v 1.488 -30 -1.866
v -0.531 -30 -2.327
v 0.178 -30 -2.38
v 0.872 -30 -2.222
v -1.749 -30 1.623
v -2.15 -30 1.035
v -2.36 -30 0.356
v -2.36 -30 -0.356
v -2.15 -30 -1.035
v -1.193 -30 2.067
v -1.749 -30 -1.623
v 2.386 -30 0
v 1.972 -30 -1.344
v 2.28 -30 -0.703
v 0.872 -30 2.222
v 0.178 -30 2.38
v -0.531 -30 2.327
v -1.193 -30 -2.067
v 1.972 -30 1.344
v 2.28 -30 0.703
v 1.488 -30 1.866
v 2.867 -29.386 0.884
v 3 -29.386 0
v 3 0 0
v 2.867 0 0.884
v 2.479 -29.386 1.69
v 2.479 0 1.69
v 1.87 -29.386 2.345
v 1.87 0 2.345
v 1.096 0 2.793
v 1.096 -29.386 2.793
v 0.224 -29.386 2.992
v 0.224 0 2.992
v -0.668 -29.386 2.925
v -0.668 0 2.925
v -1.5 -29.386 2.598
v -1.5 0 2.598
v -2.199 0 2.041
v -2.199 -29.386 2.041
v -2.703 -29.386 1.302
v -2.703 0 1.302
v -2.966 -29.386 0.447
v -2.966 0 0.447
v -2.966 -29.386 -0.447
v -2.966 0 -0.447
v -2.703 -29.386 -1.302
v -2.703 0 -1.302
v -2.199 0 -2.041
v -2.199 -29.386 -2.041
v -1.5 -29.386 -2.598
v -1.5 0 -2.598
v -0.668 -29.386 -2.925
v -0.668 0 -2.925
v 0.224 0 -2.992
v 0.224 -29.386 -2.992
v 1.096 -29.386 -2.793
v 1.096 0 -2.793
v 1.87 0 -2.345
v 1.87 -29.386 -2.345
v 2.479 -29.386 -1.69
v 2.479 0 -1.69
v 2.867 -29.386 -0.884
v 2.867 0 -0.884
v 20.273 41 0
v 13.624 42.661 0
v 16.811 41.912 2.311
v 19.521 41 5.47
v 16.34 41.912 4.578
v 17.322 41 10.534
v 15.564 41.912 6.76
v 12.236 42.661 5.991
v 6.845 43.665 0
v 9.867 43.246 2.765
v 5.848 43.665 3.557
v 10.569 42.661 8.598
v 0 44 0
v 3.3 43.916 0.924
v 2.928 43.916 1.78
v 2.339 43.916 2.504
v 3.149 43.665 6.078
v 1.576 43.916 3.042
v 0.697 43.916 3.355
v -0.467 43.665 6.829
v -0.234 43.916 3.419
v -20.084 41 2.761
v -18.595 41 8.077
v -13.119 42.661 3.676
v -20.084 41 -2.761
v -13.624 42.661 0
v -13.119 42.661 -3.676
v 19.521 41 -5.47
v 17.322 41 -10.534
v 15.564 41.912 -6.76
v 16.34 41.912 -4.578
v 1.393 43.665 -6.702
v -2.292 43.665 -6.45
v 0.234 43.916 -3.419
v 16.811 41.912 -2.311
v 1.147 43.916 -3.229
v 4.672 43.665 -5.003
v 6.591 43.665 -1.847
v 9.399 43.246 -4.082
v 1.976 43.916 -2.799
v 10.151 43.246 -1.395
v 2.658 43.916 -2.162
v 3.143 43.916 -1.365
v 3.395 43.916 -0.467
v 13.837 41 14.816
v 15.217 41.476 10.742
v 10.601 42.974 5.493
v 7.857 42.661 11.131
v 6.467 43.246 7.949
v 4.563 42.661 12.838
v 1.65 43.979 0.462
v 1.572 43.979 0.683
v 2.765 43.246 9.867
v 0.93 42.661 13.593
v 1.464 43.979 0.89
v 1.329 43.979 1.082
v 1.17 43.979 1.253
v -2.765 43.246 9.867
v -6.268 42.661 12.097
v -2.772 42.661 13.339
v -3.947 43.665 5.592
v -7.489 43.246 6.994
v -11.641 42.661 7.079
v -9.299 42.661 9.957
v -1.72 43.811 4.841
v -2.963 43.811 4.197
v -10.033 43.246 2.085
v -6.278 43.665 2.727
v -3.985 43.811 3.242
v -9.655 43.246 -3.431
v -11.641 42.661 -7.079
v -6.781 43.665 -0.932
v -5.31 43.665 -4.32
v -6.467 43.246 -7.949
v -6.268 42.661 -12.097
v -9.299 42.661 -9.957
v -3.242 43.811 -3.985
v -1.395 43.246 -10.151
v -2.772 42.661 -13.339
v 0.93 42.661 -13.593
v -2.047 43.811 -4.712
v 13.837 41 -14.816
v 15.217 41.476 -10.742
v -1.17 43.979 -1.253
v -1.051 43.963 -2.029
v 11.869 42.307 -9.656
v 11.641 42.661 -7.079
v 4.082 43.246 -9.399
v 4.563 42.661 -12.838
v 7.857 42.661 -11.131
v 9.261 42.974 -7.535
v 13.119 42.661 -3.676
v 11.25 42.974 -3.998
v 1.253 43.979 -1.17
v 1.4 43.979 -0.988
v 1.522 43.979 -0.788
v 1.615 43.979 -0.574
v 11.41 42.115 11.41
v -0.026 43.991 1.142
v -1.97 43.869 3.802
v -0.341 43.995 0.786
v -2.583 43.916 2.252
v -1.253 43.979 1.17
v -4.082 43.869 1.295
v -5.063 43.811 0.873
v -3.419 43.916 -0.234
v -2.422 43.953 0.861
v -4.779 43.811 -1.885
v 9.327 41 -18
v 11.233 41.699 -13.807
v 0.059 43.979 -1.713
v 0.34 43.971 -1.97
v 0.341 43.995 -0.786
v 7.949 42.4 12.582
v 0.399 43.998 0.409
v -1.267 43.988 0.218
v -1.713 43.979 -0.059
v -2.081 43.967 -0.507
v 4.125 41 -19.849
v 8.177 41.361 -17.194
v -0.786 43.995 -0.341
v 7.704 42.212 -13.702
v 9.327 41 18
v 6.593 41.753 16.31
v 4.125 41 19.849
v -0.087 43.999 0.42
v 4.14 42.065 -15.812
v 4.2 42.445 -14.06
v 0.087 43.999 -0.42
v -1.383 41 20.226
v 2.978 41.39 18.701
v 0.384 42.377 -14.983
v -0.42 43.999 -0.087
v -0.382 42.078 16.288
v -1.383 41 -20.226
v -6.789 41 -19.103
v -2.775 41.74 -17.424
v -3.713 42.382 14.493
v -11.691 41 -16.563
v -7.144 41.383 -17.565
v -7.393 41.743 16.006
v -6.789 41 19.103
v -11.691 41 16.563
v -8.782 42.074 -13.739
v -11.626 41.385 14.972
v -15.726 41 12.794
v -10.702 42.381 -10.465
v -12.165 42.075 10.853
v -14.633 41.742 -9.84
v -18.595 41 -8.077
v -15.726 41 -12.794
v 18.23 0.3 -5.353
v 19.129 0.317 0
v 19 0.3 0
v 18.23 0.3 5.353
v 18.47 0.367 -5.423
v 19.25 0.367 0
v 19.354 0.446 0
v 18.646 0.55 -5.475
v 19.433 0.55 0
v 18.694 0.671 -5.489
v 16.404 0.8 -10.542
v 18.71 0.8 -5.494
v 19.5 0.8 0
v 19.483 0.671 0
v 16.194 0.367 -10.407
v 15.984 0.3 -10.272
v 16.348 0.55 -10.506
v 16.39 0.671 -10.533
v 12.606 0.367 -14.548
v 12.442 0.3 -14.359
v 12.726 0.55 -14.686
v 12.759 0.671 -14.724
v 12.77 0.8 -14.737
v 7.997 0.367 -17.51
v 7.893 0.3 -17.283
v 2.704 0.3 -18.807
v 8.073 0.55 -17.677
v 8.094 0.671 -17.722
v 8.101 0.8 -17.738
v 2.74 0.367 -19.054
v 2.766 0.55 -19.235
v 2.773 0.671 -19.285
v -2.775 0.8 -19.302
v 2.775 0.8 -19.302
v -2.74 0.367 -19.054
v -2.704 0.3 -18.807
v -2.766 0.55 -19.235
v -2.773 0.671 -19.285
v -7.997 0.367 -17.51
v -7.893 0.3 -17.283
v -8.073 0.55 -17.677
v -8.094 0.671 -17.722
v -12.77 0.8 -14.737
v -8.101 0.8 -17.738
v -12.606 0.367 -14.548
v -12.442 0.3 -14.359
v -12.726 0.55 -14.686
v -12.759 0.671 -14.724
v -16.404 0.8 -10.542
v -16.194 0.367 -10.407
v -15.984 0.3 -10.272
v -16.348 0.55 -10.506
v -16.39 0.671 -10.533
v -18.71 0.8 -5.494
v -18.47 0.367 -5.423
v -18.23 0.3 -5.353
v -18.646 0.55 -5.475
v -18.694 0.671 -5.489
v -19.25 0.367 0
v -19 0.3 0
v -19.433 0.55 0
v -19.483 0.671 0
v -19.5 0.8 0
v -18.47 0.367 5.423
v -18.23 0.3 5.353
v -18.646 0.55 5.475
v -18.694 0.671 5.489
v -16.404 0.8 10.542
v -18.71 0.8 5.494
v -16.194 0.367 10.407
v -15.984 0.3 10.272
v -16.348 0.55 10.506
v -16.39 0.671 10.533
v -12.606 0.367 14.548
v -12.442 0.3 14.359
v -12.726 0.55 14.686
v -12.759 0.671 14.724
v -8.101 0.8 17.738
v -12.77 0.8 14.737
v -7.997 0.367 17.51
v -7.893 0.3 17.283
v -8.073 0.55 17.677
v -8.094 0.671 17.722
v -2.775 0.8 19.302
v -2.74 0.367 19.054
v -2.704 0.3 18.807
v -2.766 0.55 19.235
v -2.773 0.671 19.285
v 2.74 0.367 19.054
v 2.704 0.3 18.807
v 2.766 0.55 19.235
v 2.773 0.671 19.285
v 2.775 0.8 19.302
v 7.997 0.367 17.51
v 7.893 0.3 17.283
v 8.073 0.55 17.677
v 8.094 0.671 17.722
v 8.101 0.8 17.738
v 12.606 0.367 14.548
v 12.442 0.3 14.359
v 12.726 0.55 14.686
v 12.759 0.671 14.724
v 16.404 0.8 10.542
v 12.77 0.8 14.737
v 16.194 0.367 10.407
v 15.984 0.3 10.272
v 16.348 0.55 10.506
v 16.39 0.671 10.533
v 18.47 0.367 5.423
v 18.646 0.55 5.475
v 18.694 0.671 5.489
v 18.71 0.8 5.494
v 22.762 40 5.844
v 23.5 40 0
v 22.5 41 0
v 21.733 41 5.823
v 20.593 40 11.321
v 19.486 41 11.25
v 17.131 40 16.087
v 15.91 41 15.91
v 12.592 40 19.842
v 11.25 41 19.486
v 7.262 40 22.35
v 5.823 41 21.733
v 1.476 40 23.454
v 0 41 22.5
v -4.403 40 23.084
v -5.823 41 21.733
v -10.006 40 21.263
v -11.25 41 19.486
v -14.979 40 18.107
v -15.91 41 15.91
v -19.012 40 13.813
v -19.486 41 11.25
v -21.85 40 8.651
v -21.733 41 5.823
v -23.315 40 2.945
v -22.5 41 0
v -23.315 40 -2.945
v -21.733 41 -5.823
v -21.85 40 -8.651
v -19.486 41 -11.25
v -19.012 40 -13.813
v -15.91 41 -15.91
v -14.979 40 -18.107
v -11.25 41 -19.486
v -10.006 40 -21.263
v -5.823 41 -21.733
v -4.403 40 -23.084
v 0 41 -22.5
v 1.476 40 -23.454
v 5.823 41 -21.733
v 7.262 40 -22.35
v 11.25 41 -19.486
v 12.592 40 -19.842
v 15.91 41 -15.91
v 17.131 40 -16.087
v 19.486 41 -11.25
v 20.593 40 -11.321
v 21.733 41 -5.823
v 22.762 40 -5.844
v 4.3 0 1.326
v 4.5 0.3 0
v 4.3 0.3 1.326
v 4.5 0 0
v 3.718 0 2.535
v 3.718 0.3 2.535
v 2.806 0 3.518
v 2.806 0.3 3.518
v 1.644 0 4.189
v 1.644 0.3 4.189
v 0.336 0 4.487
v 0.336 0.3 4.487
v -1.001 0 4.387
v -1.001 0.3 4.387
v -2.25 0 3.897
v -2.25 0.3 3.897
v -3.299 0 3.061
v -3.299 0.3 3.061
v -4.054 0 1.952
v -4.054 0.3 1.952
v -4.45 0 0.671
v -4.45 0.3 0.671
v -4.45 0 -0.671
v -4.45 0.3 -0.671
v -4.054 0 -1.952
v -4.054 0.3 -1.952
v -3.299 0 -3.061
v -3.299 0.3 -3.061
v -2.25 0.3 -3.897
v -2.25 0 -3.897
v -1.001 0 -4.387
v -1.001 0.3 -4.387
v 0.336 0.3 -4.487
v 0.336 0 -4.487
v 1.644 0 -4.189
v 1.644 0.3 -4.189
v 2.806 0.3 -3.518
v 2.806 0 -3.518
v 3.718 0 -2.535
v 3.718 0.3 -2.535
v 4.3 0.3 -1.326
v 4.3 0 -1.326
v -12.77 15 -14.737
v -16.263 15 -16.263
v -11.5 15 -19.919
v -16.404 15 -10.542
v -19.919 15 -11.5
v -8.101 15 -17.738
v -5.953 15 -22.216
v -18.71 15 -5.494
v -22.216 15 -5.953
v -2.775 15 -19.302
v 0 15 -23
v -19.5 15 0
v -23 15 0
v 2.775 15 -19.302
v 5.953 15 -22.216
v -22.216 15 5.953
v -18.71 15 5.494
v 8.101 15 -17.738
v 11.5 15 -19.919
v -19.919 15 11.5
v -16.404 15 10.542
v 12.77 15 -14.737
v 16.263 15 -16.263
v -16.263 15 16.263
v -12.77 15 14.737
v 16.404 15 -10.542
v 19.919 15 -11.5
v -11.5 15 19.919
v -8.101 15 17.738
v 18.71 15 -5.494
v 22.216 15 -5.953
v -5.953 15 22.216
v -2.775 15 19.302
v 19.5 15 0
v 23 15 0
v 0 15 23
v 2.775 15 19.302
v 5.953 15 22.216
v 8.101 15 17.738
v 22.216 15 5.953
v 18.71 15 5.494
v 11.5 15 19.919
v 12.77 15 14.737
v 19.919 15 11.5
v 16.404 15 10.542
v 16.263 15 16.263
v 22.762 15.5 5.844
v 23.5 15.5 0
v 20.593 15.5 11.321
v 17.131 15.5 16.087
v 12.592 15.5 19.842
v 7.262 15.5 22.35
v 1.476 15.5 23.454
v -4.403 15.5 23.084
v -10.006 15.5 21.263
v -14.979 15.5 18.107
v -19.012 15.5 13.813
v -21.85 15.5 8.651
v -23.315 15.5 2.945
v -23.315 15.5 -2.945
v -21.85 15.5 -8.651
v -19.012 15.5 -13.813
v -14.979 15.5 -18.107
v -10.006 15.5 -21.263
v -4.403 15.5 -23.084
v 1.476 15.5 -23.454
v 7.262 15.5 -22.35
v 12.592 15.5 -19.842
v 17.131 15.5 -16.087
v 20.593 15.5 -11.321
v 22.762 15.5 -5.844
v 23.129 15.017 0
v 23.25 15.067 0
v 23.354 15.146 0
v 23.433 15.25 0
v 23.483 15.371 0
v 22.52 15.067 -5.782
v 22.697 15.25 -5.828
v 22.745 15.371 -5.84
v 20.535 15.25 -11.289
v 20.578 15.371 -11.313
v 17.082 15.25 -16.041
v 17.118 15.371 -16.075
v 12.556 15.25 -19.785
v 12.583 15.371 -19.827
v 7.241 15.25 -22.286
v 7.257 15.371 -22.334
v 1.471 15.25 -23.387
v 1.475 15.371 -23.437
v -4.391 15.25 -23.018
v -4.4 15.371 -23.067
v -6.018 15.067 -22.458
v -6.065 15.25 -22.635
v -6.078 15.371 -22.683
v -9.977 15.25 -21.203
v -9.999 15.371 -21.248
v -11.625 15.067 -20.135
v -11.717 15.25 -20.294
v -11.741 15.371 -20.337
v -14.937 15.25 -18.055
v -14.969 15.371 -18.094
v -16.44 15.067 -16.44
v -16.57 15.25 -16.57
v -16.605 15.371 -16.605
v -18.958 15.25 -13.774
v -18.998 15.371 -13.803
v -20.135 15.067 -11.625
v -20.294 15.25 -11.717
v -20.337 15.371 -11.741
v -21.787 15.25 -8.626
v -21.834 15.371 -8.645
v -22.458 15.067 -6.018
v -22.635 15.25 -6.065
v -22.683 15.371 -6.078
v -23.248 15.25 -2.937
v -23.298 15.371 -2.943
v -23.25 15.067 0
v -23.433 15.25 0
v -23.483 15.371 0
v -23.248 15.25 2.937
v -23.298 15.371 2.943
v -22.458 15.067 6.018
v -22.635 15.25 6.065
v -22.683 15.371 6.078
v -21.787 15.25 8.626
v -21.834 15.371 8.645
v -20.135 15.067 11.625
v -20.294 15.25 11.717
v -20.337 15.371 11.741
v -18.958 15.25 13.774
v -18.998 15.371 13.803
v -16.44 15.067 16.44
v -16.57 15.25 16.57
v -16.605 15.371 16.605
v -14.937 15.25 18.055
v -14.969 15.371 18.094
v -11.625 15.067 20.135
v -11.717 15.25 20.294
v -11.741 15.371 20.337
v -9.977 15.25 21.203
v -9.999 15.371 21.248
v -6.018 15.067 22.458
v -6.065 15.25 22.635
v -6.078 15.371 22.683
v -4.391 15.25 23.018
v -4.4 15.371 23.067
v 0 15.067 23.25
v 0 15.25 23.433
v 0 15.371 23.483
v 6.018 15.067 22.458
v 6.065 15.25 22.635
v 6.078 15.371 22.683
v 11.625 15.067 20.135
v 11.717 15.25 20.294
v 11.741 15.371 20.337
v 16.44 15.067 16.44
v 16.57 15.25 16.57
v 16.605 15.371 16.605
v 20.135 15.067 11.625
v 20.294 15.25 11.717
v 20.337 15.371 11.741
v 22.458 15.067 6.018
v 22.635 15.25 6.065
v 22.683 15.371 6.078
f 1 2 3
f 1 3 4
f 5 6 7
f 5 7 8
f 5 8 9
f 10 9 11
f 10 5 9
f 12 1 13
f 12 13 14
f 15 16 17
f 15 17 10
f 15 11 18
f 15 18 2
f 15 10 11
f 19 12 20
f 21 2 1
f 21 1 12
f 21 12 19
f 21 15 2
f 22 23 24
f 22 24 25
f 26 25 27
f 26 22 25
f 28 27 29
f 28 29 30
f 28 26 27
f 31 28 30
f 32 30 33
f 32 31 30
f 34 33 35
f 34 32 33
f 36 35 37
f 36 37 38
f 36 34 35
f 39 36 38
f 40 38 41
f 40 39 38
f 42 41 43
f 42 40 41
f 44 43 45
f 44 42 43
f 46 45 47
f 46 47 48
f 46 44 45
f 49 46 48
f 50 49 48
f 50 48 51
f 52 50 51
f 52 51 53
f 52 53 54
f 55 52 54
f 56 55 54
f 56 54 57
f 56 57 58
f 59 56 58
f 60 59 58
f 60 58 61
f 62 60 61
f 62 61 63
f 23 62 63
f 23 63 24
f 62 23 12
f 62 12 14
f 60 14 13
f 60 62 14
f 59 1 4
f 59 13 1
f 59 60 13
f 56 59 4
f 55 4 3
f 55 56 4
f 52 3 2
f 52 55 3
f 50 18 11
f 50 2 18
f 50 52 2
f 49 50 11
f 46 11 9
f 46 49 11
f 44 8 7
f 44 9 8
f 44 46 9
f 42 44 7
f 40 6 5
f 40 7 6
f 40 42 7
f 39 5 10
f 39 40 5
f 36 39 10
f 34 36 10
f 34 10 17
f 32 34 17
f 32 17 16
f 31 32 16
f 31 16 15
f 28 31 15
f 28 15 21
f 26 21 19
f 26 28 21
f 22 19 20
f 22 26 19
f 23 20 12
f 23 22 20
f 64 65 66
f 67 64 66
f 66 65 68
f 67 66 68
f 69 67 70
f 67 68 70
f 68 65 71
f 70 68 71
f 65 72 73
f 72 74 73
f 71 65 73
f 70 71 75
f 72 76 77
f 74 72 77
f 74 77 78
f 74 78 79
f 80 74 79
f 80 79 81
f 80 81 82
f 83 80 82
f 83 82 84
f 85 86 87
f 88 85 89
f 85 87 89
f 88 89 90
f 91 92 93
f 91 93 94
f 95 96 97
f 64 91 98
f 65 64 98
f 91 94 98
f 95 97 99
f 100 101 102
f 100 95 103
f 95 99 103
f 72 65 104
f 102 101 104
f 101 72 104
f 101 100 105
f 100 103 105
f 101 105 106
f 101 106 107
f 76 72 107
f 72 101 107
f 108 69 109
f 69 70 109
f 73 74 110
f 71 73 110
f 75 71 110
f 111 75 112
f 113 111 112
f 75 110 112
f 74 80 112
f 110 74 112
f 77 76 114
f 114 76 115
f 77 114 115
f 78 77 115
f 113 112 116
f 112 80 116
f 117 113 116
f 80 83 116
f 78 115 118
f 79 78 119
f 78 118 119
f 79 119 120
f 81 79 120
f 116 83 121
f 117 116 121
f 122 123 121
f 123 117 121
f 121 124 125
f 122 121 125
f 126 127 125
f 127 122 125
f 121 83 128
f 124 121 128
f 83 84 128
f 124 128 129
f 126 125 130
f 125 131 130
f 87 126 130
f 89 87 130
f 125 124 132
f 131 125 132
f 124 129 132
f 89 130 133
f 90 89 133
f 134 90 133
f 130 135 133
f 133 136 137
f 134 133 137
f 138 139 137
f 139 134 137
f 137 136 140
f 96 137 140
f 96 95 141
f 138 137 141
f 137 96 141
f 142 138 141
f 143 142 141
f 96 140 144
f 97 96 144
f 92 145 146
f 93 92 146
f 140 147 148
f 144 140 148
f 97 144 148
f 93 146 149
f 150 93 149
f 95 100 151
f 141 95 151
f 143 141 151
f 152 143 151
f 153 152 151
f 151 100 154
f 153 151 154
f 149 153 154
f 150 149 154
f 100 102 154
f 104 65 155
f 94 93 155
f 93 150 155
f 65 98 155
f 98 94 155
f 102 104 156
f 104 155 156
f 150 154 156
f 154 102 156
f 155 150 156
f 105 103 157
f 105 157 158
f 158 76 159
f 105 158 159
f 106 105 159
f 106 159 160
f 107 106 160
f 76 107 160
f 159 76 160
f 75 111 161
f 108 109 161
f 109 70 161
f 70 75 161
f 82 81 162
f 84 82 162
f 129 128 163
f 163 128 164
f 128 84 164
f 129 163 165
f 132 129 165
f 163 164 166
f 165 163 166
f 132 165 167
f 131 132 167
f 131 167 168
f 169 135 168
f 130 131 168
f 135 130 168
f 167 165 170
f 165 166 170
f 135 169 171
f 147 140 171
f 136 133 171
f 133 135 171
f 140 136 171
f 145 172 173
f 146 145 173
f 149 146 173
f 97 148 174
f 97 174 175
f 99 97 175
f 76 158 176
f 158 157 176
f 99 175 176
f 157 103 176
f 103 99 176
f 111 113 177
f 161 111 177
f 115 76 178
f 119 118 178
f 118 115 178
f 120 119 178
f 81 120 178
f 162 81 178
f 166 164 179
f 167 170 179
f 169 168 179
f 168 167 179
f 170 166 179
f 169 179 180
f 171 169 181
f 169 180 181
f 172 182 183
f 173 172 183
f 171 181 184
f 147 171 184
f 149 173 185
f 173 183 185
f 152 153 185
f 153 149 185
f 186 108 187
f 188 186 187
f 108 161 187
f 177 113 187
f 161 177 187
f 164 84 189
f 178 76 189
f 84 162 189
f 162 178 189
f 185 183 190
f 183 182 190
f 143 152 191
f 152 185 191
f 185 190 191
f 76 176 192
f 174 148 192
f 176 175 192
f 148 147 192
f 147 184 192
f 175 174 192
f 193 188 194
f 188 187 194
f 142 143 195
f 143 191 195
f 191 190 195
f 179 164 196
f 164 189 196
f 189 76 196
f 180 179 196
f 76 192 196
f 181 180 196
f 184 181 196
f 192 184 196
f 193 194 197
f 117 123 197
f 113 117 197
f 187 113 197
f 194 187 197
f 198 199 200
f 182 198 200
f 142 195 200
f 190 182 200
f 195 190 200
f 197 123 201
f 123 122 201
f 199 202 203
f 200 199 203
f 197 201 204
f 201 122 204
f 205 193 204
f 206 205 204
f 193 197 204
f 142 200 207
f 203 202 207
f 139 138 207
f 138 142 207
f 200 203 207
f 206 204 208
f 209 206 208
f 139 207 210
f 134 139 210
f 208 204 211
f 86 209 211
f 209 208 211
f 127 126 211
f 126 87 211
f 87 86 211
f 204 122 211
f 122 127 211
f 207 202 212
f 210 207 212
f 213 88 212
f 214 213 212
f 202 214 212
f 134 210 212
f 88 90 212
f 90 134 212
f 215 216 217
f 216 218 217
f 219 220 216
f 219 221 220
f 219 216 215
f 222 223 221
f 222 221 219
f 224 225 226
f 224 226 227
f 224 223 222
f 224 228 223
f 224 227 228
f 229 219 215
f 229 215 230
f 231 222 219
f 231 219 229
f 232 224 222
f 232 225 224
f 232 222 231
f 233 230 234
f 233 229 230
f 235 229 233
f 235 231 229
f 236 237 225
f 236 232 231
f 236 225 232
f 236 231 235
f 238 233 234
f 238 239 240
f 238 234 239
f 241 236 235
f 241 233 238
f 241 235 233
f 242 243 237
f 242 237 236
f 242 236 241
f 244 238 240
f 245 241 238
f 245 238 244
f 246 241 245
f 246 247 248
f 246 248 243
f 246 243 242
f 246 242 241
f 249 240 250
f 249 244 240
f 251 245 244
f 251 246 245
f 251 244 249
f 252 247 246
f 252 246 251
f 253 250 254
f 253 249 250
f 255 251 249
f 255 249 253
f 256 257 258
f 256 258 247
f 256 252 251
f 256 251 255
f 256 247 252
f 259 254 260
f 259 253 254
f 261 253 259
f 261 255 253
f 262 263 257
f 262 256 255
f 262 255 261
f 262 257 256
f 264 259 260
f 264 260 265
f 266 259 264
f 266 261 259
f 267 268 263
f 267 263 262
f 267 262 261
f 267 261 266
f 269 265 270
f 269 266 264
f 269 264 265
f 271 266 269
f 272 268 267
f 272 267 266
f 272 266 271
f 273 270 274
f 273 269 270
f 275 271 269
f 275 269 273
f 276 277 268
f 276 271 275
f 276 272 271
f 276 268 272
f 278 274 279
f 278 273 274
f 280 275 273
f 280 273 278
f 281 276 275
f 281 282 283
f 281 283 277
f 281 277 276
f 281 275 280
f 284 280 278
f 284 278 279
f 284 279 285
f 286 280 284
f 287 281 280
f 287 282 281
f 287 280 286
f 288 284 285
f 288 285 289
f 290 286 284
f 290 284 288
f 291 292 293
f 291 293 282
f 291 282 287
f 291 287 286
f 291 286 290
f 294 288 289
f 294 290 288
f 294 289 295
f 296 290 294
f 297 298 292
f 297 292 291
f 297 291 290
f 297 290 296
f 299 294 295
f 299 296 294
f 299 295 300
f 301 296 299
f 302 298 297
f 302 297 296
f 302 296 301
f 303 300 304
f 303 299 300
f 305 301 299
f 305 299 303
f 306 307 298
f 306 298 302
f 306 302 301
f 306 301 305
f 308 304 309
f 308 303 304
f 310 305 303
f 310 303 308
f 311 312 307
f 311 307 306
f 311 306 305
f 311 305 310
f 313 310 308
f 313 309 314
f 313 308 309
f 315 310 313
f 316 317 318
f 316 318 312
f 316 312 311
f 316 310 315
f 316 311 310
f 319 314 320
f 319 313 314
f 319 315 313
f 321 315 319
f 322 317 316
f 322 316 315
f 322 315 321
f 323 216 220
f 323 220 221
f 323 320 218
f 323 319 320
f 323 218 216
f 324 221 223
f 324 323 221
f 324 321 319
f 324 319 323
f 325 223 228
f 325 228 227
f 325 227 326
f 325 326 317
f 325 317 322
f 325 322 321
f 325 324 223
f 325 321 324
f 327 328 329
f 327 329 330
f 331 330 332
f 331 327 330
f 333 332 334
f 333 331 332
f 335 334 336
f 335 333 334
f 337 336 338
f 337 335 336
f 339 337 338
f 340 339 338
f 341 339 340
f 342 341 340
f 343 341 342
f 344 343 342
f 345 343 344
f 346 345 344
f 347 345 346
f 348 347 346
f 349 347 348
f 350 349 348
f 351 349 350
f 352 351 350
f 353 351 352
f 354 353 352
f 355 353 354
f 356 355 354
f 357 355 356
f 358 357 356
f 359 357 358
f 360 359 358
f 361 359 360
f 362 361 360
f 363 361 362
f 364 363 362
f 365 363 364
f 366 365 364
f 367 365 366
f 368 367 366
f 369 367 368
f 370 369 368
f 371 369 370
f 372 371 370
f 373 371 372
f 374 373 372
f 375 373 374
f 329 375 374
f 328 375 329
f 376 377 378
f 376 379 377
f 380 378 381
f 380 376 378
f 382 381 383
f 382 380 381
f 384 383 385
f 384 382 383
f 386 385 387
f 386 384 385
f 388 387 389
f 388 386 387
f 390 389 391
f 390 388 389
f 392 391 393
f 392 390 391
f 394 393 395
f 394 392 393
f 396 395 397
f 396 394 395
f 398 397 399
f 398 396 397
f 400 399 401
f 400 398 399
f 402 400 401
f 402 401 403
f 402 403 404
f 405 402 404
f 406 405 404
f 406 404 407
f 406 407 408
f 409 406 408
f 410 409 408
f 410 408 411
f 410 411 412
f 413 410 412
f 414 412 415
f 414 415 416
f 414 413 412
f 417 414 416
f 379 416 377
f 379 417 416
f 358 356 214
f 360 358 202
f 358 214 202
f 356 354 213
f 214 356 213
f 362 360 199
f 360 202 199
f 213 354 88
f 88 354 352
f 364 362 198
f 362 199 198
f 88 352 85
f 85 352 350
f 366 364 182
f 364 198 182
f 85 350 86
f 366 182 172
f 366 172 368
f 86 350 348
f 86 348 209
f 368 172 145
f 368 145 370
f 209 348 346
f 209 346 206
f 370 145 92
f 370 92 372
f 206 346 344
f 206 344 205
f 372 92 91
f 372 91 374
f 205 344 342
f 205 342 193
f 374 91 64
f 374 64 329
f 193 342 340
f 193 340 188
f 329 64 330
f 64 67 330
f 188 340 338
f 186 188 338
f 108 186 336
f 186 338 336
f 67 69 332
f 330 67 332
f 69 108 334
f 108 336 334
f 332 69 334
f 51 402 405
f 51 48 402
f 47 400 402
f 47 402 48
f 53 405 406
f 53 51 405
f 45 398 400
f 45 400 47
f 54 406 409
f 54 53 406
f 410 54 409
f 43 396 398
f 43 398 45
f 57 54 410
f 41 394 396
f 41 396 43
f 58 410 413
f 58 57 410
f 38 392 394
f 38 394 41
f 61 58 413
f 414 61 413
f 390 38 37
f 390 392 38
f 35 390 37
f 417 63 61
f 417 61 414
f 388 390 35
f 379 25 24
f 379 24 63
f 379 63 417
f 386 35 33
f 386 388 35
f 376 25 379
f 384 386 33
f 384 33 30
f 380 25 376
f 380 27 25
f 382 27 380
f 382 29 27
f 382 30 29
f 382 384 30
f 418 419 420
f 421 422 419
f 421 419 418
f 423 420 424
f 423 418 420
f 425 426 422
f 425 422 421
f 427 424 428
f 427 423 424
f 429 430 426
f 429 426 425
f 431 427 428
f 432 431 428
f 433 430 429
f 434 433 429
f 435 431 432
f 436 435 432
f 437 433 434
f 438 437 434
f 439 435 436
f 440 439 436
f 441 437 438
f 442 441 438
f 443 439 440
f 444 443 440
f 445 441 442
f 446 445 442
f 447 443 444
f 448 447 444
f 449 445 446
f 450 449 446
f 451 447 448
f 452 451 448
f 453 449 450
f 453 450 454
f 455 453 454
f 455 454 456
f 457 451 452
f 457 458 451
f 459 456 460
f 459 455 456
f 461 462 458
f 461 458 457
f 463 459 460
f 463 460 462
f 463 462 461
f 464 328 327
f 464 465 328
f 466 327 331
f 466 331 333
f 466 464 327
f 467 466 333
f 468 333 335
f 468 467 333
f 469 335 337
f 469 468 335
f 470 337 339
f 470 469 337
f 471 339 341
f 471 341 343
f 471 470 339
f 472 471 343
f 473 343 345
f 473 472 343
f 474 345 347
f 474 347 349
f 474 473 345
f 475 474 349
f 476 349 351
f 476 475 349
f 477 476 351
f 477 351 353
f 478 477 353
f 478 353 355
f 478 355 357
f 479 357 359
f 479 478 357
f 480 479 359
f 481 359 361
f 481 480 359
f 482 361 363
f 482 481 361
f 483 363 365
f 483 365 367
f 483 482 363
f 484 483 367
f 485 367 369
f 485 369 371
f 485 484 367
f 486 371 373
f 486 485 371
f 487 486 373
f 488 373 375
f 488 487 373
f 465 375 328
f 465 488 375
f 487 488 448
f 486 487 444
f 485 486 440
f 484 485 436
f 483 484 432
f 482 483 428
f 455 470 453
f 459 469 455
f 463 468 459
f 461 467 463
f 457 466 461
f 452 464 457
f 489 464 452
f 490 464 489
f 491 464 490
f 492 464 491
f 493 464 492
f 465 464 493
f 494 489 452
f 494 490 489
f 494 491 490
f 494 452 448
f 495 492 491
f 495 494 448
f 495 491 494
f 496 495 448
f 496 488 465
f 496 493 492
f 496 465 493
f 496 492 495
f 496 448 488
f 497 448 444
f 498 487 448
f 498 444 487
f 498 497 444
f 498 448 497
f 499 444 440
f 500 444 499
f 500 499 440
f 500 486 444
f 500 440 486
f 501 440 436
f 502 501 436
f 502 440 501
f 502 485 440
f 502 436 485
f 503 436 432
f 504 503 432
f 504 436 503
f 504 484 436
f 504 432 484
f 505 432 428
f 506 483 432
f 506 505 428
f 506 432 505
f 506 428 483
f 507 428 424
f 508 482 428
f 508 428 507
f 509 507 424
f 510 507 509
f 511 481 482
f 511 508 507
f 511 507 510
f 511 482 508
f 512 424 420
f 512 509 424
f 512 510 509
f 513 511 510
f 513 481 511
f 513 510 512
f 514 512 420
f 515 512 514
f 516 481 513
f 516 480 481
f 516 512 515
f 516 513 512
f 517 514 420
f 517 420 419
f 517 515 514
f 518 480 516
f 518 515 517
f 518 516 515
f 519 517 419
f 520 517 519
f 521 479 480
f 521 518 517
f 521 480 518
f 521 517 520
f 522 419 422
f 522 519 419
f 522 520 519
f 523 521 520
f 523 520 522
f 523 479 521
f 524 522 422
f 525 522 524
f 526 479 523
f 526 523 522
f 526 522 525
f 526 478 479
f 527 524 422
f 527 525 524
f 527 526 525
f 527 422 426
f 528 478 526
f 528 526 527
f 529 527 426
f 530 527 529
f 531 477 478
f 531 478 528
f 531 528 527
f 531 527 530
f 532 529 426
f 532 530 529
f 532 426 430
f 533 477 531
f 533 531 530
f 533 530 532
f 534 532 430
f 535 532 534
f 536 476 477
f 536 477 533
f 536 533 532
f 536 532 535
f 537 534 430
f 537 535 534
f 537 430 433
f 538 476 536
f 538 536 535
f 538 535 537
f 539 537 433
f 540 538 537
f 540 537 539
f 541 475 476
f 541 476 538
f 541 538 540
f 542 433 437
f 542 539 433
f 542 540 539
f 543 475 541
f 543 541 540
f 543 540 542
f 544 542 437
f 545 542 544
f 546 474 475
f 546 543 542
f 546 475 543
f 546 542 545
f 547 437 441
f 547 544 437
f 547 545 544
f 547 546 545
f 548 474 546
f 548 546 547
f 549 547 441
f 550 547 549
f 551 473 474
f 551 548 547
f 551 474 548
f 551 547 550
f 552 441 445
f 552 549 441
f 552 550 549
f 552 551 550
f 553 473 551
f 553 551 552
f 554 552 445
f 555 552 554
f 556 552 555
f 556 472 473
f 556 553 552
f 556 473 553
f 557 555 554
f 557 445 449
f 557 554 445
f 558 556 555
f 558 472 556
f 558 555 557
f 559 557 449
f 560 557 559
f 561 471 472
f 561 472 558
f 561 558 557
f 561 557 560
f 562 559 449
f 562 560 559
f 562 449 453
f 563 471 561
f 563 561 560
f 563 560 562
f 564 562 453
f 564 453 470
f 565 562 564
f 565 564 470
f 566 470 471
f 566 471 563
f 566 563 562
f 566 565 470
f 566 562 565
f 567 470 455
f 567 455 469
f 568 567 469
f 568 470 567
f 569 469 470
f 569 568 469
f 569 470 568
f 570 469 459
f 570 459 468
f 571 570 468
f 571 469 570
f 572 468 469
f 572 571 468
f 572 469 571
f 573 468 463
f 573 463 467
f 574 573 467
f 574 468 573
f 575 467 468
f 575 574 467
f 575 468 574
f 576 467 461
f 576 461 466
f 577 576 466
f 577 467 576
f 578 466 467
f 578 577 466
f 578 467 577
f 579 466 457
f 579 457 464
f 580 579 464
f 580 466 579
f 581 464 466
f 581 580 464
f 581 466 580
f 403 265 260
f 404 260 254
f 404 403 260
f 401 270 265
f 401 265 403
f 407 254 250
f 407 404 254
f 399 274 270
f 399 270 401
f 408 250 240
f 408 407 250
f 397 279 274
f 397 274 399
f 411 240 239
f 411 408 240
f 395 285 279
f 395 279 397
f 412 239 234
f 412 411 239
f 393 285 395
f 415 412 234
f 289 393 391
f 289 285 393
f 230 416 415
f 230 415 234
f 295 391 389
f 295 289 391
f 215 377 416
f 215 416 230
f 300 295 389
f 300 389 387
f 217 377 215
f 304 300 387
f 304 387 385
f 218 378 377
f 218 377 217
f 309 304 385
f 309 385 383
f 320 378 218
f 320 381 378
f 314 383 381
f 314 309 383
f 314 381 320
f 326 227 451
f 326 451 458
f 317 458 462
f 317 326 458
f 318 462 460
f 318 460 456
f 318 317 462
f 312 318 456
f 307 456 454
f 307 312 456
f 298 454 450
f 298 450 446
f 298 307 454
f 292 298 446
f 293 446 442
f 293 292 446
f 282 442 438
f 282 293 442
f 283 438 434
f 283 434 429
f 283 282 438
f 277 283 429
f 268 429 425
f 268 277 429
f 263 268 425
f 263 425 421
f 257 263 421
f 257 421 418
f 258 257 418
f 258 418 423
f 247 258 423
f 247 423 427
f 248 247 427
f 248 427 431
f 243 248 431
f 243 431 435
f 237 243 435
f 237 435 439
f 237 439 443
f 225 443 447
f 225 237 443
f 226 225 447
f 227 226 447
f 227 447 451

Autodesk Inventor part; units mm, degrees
ref_plane "YZ Plane" through (0, 0, 0) normal (1, 0, 0) x (0, 1, 0)
ref_plane "XZ Plane" through (0, 0, 0) normal (0, 1, 0) x (-1, 0, 0)
ref_plane "XY Plane" through (0, 0, 0) normal (0, 0, 1) x (1, 0, 0)
sketch "Sketch_1" plane through (0, 0, 0) normal (0, 0, 1) x (1, 0, 0)
  line L0 (0, 0) -> (0, 44)
  arc A0 (20.2731, 41) -> (0, 44) centre (0, -26) ccw
  line L1 (20.2731, 41) -> (22.5, 41)
  line L2 (22.5, 41) -> (23.5, 40)
  line L3 (23.5, 40) -> (23.5, 15.5)
  arc A1 (23, 15) -> (23.5, 15.5) centre (23, 15.5) ccw
  line L4 (23, 15) -> (19.5, 15)
  line L5 (19.5, 15) -> (19.5, 0.8)
  arc A2 (19, 0.3) -> (19.5, 0.8) centre (19, 0.8) ccw
  line L6 (19, 0.3) -> (4.5, 0.3)
  line L7 (4.5, 0.3) -> (4.5, 0)
  line L8 (4.5, 0) -> (0, 0)
  line L9 (0, 0) -> (0, 44)
revolve "Revolution1" add sketch "Sketch_1" angle 360 about axis through (0, 0, 0) along (0, -1, 0)
sketch "Sketch_2" plane through (0, 0, 0) normal (0, 0, 1) x (1, 0, 0)
  line L0 (0, -30) -> (0, 0)
  line L1 (0, 0) -> (3, 0)
  line L2 (3, 0) -> (3, -29.3865)
  line L3 (3, -29.3865) -> (2.3865, -30)
  line L4 (2.3865, -30) -> (0, -30)
  line L5 (0, -30) -> (0, 0)
revolve "Revolution2" add sketch "Sketch_2" angle 360 about axis through (0, -30, 0) along (0, -1, 0)
thread "Thread1" size "M6x1" class "6g" standard "ISO Metric profile" length 29 offset 1
properties part number "Torque limiting knob screw GN 5910-47-M6-30-1-SW"
